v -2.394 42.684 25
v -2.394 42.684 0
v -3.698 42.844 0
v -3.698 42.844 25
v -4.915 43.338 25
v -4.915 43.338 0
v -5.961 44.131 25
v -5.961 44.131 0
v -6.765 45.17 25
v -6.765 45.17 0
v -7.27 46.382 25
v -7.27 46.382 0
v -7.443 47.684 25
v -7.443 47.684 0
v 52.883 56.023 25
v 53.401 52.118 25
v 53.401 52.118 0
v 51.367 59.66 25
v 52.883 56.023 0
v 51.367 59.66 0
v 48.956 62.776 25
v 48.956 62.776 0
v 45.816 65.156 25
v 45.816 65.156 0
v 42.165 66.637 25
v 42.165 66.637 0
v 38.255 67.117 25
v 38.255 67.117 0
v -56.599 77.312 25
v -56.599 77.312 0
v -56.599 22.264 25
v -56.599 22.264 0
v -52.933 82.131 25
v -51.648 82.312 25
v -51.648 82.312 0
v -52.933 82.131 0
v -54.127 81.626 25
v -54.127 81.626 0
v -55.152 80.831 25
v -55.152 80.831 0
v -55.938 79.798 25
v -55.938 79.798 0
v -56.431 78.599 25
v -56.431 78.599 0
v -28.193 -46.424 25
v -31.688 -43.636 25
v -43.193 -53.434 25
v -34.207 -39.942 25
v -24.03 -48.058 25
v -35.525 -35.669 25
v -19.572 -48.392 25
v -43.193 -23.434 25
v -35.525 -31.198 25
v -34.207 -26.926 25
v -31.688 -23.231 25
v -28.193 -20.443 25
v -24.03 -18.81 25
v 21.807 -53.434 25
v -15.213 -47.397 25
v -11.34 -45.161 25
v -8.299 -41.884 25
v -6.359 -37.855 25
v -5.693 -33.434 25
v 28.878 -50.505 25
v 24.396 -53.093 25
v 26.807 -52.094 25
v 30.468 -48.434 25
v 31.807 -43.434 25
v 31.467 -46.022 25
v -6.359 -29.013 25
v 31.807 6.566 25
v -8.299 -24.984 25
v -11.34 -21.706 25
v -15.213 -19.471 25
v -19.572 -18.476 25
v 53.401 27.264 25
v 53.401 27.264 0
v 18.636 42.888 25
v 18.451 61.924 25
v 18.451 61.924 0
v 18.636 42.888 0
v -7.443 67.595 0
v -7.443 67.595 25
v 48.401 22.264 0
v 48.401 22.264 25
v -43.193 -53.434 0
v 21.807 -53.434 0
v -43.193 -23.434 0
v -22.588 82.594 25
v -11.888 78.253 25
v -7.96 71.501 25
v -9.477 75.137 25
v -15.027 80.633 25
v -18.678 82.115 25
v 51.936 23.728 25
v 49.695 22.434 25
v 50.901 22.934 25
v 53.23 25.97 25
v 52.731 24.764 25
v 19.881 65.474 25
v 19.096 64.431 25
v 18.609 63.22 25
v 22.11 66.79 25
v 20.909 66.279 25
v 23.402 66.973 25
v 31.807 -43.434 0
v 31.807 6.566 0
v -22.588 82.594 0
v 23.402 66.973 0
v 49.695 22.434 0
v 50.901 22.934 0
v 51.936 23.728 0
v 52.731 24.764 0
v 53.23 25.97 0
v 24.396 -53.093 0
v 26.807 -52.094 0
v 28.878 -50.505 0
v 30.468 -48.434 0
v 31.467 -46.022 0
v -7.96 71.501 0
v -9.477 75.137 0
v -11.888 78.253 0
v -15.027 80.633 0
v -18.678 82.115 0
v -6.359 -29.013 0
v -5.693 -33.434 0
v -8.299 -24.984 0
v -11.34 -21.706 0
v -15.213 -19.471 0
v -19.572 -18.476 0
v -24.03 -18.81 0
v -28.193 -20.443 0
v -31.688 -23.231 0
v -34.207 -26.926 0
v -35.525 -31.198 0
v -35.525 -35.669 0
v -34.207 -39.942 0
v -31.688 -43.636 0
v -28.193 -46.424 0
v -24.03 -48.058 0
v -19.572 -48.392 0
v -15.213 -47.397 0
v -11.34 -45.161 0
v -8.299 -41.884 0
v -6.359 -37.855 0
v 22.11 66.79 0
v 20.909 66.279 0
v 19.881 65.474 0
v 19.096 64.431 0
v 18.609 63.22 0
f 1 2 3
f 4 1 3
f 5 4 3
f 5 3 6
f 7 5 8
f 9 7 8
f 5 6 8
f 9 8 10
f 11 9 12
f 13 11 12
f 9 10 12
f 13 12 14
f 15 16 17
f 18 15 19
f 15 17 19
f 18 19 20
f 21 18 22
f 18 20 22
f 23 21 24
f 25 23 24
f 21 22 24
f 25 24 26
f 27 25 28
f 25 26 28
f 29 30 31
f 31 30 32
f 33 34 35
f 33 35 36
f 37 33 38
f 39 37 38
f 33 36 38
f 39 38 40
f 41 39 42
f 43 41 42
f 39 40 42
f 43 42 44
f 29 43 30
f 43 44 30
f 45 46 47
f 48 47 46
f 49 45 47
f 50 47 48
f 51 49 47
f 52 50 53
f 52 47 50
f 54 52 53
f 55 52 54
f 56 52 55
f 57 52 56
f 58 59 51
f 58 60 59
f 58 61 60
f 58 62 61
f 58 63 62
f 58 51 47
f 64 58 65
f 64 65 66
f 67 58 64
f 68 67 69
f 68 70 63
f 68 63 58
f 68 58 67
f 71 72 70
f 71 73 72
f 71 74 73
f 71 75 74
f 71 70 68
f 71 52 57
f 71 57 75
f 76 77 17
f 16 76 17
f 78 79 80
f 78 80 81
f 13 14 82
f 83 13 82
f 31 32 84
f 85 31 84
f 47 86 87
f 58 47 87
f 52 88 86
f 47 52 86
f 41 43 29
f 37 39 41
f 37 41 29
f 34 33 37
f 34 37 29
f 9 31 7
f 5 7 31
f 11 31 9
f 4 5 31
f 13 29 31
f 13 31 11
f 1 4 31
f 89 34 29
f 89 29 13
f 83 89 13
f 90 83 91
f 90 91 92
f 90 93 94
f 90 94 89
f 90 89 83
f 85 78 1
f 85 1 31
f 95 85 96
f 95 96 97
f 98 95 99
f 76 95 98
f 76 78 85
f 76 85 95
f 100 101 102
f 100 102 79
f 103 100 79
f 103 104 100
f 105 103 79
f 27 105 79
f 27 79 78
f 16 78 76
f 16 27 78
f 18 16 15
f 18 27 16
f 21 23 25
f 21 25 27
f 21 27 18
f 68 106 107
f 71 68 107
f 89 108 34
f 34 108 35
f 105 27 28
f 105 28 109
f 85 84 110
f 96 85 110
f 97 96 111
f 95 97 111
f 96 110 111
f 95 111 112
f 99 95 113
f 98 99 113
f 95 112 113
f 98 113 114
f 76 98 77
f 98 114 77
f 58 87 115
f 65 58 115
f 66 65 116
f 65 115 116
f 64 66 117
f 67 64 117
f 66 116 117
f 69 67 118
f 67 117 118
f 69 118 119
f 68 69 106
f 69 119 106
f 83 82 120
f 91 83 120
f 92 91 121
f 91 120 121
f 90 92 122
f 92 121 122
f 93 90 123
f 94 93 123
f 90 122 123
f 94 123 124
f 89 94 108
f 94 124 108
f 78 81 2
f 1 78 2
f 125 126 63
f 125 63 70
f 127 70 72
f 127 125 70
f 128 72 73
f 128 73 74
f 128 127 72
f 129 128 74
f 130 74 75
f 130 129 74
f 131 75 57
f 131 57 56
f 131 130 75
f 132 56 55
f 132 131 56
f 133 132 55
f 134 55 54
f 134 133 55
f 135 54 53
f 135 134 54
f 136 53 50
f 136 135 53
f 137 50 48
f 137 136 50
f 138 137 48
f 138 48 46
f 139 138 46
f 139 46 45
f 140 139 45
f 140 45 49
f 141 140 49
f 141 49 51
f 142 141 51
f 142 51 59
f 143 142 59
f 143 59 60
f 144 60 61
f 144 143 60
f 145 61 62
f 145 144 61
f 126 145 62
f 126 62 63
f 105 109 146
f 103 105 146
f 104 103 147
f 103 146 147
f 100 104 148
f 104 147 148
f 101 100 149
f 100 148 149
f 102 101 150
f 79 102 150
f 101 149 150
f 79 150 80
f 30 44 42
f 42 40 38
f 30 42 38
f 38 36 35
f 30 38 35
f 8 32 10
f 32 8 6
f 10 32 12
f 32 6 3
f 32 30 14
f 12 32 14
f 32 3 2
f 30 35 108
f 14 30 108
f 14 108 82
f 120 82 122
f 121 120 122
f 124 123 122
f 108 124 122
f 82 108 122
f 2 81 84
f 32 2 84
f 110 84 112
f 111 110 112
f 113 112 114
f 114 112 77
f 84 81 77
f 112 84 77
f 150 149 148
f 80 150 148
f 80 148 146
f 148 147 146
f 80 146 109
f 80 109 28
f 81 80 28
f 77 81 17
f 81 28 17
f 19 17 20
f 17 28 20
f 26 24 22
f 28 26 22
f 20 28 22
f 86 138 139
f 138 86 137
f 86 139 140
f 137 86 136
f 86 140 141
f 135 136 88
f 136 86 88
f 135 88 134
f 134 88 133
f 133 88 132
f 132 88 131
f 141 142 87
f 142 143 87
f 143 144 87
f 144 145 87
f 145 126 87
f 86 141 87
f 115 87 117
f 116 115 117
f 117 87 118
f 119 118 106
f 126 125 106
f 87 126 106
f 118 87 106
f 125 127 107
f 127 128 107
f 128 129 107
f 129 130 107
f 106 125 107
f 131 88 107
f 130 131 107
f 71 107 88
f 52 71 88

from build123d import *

# Parameters (mm, degrees)
F0_R     = 15
F1_DEPTH = 25


with BuildPart() as f1:
    # F0 (on Top) → F1 (new body)
    with BuildSketch(Plane.XY):
        with BuildLine():
            Line((-56.599461, 77.312244), (-56.599461, 22.263936))
            Line((-56.599461, 22.263936), (48.400539, 22.263936))
            ThreePointArc((48.400539, 22.263936), (51.936073, 23.728402), (53.400539, 27.263936))
            Line((53.400539, 27.263936), (53.400539, 52.117598))
            ThreePointArc((53.400539, 52.117598), (48.955529, 62.775561), (38.254915, 67.116891))
            Line((38.254915, 67.116891), (23.401953, 66.972688))
            ThreePointArc((23.401953, 66.972688), (19.880803, 65.473967), (18.45073, 61.924382))
            Line((18.45073, 61.924382), (18.635546, 42.888273))
            Line((18.635546, 42.888273), (-2.394281, 42.6841))
            ThreePointArc((-2.394281, 42.6841), (-5.961152, 44.13121), (-7.442822, 47.683865))
            Line((-7.442822, 47.683865), (-7.442822, 67.594846))
            ThreePointArc((-7.442822, 67.594846), (-11.887832, 78.252809), (-22.588446, 82.594139))
            Line((-22.588446, 82.594139), (-51.648002, 82.312008))
            ThreePointArc((-51.648002, 82.312008), (-55.152115, 80.830574), (-56.599461, 77.312244))
        make_face()
        with BuildLine():
            Line((31.807323, 6.566149), (-43.192677, -23.433851))
            Line((-43.192677, -23.433851), (-43.192677, -53.433851))
            Line((-43.192677, -53.433851), (21.807323, -53.433851))
            ThreePointArc((21.807323, -53.433851), (28.878391, -50.504919), (31.807323, -43.433851))
            Line((31.807323, -43.433851), (31.807323, 6.566149))
        make_face()
        with Locations((-20.692677, -33.433851)):
            Circle(F0_R, mode=Mode.SUBTRACT)
    extrude(amount=F1_DEPTH)


solid = f1.part
